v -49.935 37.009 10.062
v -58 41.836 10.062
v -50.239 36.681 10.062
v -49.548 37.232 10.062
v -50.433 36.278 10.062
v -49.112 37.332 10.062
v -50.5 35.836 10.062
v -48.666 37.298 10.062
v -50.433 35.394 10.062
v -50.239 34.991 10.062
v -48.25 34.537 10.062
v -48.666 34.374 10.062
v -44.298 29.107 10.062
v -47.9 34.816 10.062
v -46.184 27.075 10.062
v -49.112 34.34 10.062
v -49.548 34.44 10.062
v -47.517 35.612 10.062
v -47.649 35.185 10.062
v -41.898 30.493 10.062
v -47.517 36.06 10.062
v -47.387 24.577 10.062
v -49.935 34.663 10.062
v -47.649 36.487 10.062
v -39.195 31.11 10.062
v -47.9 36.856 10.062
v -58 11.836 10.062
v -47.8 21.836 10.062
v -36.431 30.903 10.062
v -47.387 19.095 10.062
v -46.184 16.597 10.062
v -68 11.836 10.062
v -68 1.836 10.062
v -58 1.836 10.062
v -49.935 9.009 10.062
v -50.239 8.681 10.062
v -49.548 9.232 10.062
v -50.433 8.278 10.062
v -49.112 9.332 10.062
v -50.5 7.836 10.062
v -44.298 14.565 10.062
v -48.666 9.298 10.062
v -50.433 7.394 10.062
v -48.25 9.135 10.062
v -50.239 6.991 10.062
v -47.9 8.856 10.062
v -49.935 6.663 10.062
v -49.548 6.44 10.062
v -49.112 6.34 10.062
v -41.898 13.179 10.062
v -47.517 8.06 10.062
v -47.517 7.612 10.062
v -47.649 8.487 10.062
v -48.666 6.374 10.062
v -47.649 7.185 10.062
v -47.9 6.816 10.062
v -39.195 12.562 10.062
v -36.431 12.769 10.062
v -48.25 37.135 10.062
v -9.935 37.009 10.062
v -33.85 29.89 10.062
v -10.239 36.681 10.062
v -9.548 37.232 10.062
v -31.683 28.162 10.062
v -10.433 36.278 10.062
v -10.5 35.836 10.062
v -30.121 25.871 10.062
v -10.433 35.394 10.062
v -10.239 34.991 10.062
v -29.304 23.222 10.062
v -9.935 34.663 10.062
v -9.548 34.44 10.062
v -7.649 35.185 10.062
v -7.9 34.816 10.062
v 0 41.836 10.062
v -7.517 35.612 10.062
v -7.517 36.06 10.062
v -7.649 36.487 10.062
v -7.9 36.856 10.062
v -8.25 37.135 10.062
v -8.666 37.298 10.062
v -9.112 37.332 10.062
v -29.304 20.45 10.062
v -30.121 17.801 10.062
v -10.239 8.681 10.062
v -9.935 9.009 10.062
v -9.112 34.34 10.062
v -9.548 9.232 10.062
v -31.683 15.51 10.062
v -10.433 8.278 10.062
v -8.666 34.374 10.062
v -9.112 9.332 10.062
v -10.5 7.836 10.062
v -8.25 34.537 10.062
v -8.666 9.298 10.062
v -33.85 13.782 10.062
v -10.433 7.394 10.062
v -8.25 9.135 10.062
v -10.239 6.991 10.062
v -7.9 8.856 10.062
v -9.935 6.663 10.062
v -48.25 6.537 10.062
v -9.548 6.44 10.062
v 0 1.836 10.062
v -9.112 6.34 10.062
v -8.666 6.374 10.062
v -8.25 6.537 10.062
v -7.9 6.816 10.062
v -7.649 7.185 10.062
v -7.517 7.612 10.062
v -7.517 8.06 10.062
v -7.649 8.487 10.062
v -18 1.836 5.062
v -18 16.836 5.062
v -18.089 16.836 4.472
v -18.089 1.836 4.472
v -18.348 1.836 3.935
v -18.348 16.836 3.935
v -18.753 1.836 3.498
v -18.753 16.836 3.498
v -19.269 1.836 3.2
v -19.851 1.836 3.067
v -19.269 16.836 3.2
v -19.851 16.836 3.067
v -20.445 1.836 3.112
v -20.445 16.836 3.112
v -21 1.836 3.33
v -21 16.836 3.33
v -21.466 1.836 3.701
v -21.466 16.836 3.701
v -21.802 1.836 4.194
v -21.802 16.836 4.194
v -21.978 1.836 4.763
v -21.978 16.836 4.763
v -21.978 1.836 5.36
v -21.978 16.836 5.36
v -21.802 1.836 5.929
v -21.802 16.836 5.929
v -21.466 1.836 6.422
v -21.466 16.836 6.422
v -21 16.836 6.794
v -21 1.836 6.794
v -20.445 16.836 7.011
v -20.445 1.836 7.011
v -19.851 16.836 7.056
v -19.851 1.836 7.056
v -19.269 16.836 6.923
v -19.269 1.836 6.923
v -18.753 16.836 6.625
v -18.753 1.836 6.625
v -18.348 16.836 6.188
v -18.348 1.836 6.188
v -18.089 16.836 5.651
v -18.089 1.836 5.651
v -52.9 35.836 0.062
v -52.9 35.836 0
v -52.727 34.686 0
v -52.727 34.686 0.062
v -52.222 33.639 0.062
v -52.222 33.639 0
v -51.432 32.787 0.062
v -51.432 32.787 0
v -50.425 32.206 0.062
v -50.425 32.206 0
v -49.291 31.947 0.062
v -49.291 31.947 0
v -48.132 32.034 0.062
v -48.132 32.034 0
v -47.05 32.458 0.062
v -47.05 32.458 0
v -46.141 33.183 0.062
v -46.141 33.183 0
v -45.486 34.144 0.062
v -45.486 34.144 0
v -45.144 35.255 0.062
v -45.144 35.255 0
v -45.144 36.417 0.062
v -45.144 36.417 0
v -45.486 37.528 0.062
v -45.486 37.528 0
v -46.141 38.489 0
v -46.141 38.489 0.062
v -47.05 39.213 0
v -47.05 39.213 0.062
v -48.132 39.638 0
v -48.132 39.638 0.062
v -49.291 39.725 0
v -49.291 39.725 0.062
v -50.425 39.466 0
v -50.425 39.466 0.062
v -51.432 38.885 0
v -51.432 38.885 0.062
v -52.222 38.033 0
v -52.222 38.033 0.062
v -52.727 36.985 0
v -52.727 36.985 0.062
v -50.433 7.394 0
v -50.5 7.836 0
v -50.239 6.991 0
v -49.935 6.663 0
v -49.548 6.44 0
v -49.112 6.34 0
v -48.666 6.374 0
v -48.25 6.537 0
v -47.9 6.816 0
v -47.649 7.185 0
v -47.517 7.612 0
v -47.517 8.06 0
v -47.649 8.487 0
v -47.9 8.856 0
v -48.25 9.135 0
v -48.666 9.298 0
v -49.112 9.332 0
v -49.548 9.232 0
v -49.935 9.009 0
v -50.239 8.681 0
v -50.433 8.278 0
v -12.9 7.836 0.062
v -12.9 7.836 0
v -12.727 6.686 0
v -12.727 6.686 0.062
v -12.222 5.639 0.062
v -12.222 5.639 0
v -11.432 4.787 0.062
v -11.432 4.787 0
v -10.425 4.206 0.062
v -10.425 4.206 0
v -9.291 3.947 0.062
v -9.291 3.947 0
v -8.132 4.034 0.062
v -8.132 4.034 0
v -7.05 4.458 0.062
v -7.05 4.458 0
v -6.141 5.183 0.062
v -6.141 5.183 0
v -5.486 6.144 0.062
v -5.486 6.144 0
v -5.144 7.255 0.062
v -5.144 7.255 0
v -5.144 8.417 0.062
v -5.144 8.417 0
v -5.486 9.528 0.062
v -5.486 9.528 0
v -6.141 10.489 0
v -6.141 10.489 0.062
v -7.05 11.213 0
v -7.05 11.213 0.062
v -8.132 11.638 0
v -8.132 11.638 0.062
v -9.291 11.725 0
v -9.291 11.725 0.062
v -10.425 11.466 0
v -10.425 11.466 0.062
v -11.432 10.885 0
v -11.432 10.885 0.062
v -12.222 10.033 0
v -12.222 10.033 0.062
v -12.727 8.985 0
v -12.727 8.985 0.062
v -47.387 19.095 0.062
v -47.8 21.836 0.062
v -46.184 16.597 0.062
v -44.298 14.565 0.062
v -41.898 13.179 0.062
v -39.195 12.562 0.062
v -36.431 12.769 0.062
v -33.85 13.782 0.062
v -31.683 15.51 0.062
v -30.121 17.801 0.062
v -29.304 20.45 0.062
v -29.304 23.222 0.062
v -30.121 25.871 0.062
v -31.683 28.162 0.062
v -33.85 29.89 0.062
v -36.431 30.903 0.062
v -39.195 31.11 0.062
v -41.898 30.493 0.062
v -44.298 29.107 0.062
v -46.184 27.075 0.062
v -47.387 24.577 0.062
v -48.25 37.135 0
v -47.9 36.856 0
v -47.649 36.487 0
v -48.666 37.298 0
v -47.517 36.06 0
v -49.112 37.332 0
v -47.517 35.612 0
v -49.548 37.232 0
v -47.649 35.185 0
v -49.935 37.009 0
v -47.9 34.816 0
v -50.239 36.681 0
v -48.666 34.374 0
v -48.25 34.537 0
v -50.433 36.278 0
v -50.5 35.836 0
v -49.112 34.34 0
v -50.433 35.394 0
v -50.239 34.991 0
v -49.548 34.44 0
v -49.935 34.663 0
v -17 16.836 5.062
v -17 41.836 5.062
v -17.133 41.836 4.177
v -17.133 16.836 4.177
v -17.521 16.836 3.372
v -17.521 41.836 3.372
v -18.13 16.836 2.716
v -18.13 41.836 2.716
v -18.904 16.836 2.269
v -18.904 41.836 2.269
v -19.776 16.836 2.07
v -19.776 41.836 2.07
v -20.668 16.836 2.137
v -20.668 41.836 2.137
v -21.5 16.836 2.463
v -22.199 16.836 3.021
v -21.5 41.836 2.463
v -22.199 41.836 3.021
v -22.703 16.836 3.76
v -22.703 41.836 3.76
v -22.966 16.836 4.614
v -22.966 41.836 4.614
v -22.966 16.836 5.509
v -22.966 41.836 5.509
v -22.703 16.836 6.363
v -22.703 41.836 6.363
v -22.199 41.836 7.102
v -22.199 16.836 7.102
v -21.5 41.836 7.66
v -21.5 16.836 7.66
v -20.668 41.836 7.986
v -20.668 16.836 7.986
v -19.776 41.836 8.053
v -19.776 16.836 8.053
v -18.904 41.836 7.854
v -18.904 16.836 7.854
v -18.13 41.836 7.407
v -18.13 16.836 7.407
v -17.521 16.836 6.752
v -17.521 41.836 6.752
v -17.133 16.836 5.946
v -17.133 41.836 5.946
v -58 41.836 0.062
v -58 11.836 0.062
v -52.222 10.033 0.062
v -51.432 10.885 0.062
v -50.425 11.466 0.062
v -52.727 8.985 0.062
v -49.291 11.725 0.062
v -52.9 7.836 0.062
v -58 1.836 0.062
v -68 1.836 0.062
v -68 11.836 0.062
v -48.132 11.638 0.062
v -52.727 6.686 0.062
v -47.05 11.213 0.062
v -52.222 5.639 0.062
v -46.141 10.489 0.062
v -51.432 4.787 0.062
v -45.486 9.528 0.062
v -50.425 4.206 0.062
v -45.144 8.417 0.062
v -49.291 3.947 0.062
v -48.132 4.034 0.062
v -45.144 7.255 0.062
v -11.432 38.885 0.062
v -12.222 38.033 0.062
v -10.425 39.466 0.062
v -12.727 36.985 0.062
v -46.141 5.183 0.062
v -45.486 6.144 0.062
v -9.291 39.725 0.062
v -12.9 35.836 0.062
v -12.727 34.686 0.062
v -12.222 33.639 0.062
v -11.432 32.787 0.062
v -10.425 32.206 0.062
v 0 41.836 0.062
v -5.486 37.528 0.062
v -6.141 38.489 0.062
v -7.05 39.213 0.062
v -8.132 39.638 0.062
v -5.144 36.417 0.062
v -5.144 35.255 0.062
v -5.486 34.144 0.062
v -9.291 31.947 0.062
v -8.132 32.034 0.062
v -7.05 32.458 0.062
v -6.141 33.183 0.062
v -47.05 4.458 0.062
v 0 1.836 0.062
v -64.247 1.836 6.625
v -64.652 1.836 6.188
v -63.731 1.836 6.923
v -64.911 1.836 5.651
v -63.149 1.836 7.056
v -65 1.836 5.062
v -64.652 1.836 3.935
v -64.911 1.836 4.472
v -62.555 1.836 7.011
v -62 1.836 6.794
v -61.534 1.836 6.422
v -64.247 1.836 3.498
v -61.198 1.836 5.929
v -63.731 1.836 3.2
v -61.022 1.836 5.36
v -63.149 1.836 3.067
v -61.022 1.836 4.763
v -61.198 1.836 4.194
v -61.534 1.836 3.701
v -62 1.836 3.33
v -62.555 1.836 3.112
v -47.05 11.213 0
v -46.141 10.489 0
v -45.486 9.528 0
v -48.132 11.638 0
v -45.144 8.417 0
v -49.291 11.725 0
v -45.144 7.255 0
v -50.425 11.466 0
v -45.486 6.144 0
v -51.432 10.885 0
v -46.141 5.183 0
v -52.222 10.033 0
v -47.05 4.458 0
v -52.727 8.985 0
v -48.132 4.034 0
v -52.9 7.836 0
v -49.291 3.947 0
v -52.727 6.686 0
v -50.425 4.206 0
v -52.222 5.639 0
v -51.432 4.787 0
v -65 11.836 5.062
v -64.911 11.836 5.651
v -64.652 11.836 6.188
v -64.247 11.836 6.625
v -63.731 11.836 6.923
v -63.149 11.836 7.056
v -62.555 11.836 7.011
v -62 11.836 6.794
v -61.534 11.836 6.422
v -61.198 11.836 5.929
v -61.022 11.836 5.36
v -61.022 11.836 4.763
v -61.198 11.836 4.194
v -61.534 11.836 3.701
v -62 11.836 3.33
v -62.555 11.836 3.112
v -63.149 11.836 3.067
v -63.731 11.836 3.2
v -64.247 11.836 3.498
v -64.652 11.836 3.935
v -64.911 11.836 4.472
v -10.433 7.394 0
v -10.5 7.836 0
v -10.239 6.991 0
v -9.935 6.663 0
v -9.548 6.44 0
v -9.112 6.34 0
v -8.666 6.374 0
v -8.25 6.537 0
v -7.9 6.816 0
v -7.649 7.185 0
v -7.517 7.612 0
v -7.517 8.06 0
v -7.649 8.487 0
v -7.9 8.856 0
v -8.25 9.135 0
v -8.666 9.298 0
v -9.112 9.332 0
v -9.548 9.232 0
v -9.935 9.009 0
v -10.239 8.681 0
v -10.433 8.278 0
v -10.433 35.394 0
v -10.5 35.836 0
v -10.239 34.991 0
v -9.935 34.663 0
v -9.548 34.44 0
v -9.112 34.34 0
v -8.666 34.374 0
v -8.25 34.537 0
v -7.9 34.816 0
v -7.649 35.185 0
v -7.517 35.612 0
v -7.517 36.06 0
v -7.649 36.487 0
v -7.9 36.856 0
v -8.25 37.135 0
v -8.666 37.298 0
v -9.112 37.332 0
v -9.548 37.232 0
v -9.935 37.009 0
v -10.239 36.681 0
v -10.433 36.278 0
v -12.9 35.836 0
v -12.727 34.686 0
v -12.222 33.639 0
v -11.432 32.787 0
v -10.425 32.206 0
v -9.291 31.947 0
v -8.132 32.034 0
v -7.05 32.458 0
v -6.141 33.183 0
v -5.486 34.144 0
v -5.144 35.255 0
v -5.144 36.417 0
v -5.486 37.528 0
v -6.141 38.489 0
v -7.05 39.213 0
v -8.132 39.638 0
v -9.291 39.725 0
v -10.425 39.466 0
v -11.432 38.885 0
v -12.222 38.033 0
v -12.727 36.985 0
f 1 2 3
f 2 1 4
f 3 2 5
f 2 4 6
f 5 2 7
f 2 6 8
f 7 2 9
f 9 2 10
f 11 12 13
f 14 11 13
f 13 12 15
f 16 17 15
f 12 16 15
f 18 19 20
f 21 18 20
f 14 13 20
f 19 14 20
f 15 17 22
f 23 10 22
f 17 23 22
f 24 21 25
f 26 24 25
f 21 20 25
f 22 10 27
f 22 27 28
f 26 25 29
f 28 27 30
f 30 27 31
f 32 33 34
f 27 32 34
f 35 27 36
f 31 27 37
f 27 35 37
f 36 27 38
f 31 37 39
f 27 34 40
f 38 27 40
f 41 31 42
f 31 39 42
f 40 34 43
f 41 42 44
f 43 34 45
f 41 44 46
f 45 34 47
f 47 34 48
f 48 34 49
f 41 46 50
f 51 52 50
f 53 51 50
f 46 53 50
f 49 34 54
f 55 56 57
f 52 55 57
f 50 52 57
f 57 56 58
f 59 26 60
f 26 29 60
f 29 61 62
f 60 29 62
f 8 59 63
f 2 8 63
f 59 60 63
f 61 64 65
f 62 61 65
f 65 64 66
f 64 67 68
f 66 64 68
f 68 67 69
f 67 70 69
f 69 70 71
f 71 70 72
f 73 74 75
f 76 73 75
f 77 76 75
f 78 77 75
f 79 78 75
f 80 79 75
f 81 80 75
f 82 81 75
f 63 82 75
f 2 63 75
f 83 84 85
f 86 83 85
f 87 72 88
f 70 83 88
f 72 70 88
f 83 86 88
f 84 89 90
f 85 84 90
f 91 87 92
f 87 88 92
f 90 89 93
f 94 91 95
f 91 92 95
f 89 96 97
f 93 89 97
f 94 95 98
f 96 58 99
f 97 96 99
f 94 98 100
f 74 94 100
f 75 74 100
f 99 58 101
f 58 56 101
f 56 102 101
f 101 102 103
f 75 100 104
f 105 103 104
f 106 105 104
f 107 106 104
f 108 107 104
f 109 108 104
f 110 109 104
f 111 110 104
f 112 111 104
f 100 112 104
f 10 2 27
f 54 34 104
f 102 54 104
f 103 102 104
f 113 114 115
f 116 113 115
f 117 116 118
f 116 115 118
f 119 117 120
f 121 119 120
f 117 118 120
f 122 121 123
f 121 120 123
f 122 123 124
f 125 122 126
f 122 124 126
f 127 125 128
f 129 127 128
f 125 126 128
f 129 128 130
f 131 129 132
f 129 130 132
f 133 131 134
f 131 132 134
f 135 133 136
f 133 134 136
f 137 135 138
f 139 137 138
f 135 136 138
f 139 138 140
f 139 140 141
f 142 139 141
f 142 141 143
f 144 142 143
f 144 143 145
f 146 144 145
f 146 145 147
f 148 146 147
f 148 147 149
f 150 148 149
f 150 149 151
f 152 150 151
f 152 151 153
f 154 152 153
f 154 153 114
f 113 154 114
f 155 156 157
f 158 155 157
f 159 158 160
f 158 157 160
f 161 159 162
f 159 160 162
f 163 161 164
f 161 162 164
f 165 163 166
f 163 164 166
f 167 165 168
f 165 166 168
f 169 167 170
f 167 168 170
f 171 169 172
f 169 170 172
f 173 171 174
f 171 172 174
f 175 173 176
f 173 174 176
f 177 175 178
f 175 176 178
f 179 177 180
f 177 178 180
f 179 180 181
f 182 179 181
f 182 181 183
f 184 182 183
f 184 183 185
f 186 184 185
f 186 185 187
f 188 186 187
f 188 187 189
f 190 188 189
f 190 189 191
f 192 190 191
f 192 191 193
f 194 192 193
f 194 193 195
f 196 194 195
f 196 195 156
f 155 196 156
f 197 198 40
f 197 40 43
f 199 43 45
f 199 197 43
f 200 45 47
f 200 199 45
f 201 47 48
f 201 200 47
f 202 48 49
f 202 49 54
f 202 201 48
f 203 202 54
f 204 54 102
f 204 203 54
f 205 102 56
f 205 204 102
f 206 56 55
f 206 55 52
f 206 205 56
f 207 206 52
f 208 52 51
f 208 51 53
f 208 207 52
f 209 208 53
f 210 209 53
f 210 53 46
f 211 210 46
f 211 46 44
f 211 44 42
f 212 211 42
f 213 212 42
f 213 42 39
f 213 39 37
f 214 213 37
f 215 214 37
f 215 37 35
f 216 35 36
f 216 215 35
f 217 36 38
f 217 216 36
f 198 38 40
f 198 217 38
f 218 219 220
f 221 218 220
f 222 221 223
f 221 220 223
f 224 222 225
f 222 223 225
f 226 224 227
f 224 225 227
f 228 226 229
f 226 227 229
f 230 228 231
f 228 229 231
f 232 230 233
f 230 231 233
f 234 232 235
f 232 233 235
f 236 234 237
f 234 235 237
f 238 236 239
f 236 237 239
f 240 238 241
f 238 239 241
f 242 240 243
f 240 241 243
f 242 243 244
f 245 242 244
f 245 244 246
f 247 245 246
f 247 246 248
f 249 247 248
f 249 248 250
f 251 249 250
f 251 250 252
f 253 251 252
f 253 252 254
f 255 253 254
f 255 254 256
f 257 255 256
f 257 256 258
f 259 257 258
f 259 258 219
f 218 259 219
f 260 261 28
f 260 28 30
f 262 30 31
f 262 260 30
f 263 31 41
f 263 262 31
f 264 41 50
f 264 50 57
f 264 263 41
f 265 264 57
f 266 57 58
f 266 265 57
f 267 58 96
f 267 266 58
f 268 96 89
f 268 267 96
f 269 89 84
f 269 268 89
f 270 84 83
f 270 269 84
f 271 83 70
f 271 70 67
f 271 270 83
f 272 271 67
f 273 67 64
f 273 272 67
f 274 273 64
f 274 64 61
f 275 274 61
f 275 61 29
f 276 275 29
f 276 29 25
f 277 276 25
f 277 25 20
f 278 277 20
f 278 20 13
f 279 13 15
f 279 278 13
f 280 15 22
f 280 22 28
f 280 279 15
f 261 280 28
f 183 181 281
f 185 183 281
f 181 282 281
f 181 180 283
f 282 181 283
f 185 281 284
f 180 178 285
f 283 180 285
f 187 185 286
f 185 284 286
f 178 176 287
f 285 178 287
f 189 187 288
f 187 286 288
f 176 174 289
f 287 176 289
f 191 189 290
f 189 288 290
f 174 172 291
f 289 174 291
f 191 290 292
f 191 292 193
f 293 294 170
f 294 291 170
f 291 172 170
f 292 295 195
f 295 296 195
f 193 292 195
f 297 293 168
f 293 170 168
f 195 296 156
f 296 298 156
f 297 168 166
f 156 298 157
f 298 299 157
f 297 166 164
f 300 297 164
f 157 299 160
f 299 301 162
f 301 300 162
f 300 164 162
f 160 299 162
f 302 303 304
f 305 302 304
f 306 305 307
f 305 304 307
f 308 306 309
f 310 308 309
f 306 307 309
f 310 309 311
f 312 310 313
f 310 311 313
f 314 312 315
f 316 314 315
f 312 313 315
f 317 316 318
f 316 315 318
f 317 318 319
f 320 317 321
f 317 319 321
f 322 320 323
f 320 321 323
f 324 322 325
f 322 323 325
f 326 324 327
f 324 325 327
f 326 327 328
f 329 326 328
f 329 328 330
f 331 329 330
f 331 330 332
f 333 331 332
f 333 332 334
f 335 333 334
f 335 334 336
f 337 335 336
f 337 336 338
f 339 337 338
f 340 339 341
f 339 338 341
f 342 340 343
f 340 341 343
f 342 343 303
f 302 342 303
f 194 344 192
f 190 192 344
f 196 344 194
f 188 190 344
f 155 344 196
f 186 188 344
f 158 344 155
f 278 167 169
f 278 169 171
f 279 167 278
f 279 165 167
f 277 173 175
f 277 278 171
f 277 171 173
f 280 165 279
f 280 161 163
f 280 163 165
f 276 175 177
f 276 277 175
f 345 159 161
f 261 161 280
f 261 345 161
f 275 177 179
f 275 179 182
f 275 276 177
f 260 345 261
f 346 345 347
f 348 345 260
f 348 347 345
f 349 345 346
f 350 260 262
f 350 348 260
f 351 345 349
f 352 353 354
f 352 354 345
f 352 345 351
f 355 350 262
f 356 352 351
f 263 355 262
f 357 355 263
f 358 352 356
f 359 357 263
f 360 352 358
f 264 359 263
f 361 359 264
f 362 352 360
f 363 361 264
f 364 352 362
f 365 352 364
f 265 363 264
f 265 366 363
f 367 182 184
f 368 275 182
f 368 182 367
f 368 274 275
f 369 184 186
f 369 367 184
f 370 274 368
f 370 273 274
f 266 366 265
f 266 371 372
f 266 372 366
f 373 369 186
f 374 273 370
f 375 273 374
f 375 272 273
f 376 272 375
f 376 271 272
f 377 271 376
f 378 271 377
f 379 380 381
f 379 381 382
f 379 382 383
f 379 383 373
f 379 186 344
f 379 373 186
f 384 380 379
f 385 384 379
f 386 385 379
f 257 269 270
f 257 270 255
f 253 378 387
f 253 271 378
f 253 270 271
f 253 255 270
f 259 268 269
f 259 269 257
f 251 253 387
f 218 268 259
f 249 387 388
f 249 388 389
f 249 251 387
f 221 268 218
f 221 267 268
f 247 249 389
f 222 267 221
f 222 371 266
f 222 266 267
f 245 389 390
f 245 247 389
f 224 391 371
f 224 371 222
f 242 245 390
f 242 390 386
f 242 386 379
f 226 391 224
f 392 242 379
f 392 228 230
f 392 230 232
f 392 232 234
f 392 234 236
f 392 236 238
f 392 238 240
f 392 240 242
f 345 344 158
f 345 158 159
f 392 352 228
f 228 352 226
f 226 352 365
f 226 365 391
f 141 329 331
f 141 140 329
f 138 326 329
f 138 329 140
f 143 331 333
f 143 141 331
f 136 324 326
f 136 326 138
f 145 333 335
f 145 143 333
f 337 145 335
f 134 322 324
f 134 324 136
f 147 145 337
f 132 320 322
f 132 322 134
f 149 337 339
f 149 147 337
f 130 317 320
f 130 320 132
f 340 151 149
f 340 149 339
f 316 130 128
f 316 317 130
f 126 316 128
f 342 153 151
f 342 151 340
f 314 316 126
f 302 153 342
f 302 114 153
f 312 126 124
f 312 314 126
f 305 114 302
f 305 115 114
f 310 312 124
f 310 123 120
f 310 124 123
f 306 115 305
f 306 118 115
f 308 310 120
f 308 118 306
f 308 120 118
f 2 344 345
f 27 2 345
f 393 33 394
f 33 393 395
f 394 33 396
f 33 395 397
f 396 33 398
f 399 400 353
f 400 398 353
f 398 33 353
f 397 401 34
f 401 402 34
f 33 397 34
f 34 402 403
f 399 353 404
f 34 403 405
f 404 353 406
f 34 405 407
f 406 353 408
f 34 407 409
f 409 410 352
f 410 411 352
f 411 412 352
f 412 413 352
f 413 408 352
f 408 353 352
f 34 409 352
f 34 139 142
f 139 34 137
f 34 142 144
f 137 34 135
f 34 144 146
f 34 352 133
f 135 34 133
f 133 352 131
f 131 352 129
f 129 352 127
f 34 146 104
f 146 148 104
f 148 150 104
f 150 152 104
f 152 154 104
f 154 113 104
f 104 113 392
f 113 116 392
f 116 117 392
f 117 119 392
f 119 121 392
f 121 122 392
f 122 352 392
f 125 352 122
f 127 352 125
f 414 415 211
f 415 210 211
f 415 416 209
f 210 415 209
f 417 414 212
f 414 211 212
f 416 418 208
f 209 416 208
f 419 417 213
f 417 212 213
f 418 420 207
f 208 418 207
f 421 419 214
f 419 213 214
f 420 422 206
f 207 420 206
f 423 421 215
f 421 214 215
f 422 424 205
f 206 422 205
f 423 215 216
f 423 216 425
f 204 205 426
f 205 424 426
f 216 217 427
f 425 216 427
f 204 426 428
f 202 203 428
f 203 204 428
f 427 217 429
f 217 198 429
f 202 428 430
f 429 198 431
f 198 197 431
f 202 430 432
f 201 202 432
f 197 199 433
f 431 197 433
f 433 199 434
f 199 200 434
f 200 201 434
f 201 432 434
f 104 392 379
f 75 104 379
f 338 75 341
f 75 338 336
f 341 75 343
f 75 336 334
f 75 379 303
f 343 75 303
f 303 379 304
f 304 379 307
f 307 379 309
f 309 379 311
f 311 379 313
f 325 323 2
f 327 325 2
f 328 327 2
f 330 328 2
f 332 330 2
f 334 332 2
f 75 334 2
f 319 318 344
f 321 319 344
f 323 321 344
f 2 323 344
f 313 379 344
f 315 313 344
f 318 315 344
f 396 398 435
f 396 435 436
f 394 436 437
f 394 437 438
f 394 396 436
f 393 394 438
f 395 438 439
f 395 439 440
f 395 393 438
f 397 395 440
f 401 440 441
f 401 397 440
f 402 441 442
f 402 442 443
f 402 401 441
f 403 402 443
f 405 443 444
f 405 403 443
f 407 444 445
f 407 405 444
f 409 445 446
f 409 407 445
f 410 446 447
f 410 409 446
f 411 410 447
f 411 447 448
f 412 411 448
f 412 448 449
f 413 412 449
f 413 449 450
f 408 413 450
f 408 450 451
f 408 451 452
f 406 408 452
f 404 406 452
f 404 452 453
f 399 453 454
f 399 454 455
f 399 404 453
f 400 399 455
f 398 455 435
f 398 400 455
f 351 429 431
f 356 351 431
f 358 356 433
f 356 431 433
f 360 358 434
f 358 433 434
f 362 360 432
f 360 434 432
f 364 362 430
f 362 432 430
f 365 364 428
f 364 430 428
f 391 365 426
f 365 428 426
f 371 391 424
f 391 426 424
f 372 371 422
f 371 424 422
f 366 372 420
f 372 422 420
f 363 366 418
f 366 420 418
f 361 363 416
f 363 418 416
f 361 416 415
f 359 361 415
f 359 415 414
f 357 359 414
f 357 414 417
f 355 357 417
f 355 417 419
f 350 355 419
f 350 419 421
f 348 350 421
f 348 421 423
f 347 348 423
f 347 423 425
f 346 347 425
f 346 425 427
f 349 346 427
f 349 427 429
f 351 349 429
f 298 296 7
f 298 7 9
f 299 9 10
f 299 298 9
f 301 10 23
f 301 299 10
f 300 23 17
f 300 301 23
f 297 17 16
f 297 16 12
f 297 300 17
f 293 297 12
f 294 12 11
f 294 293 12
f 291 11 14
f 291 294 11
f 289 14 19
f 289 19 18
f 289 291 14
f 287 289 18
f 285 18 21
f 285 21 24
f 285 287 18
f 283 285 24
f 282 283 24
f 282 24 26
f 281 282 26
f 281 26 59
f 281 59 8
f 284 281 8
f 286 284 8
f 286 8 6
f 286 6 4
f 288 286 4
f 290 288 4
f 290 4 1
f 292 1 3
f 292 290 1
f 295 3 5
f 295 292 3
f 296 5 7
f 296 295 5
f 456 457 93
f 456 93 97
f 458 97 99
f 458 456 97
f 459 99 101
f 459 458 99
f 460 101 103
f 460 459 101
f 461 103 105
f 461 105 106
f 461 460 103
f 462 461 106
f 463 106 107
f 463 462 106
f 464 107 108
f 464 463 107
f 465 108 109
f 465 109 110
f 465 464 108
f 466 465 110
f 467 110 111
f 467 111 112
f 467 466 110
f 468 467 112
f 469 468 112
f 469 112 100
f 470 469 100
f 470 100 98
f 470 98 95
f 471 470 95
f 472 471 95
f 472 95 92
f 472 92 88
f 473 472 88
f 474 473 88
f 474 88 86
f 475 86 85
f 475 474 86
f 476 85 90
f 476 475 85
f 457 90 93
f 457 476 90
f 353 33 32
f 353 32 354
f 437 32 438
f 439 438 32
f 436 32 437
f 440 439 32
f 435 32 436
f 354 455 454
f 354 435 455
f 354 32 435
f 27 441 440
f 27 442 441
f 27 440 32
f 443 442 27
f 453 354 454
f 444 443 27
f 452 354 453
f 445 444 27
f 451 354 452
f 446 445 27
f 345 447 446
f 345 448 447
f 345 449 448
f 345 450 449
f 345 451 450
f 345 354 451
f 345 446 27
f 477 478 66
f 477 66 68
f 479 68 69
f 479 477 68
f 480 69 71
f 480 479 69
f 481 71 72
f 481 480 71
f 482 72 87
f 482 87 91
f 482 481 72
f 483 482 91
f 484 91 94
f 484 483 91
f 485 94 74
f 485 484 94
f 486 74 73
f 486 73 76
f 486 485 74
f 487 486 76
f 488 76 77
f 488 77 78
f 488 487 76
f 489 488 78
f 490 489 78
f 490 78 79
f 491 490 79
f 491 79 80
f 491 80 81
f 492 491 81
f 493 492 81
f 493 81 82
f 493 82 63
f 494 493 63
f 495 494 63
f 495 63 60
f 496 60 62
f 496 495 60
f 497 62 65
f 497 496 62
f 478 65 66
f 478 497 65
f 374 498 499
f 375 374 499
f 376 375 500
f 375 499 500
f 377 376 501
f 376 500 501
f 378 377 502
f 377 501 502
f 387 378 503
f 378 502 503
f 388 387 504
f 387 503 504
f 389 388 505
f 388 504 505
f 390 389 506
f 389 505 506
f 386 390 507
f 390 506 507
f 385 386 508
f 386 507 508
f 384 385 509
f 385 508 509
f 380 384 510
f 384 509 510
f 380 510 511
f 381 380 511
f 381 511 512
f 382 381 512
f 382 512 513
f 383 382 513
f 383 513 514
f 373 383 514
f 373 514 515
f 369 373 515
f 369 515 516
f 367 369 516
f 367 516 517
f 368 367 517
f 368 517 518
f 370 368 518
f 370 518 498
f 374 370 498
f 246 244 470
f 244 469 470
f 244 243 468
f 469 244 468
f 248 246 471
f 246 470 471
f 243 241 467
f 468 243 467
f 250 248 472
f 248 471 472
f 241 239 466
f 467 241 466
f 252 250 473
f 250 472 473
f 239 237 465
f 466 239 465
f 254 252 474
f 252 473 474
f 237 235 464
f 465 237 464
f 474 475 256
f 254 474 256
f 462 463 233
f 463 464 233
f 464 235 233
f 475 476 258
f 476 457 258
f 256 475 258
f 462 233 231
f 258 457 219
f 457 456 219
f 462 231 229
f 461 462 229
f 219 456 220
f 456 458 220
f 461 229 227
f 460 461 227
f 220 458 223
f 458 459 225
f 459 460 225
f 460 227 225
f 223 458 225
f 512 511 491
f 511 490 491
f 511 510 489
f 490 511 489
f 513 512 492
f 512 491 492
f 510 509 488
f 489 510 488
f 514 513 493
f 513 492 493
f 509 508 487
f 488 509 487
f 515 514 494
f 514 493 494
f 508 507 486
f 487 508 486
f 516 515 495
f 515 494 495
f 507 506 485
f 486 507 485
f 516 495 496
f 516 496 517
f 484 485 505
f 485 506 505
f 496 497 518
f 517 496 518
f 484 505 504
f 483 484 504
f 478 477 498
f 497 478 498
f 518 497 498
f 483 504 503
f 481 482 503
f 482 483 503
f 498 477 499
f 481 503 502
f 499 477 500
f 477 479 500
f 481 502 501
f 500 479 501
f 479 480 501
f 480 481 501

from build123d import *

# Parameters (mm, degrees)
SKETCH1_R             = 3.9
SKETCH1_R_2           = 1.5
BOSS_EXTRUDE1_DEPTH   = 10.061552014
BOSS_EXTRUDE1_2_DEPTH = 10.061552014
BOSS_EXTRUDE1_3_DEPTH = 10.061552014
BOSS_EXTRUDE1_4_DEPTH = 10.061552014
BOSS_EXTRUDE2_START   = 1.861552
SKETCH2_R             = 3.9
SKETCH2_R_2           = 9.3
BOSS_EXTRUDE2_DEPTH   = 10
CUT_EXTRUDE1_DEPTH    = 25
CUT_EXTRUDE2_DEPTH    = 72.170463178
SKETCH5_W             = 10
SKETCH5_H             = 10
SKETCH5_R             = 2
BOSS_EXTRUDE3_DEPTH   = 10


with BuildPart() as part:
    # Sketch1 → Boss-Extrude1 (new body)
    with BuildSketch(Plane.XY):
        with Locations(Location((-49, 7.83595021, 0), (0, 0, 180))):
            Circle(SKETCH1_R)
        with Locations(Location((-49, 7.83595021, 0), (0, 0, 180))):
            Circle(SKETCH1_R_2, mode=Mode.SUBTRACT)
    extrude(amount=BOSS_EXTRUDE1_DEPTH)



with BuildPart() as body_2:
    # Sketch1 → Boss-Extrude1 2 (new body)
    with BuildSketch(Plane.XY):
        with Locations(Location((-49, 35.83595021, 0), (0, 0, 180))):
            Circle(SKETCH1_R)
        with Locations(Location((-49, 35.83595021, 0), (0, 0, 180))):
            Circle(SKETCH1_R_2, mode=Mode.SUBTRACT)
    extrude(amount=BOSS_EXTRUDE1_2_DEPTH)


with BuildPart() as body_3:
    # Sketch1 → Boss-Extrude1 3 (new body)
    with BuildSketch(Plane.XY):
        with Locations(Location((-9, 35.83595021, 0), (0, 0, 180))):
            Circle(SKETCH1_R)
        with Locations(Location((-9, 35.83595021, 0), (0, 0, 180))):
            Circle(SKETCH1_R_2, mode=Mode.SUBTRACT)
    extrude(amount=BOSS_EXTRUDE1_3_DEPTH)


with BuildPart() as body_4:
    # Sketch1 → Boss-Extrude1 4 (new body)
    with BuildSketch(Plane.XY):
        with Locations(Location((-9, 7.83595021, 0), (0, 0, 180))):
            Circle(SKETCH1_R)
        with Locations(Location((-9, 7.83595021, 0), (0, 0, 180))):
            Circle(SKETCH1_R_2, mode=Mode.SUBTRACT)
    extrude(amount=BOSS_EXTRUDE1_4_DEPTH)


with BuildPart() as part_1:
    add(part.part)

    add(body_2.part)  # Boss-Extrude2 merges body 2

    add(body_3.part)  # Boss-Extrude2 merges body 3

    add(body_4.part)  # Boss-Extrude2 merges body 4
    # Sketch2 → Boss-Extrude2 (add)
    with BuildSketch(Plane.XY.offset(-1.8).offset(BOSS_EXTRUDE2_START)):
        Polygon((-58, 1.83595021), (0, 1.83595021), (0, 5.290014366), (0, 38.441339865), (0, 41.83595021), (-58, 41.83595021), align=None)
        with Locations(Location((-9, 35.83595021, 0), (0, 0, 180))):
            Circle(SKETCH2_R, mode=Mode.SUBTRACT)
        with Locations((-49, 7.83595021)):
            Circle(SKETCH2_R, mode=Mode.SUBTRACT)
        with Locations(Location((-38.5, 21.83595021, 0), (0, 0, 180))):
            Circle(SKETCH2_R_2, mode=Mode.SUBTRACT)
        with Locations(Location((-49, 35.83595021, 0), (0, 0, 180))):
            Circle(SKETCH2_R, mode=Mode.SUBTRACT)
        with Locations(Location((-9, 7.83595021, 0), (0, 0, 180))):
            Circle(SKETCH2_R, mode=Mode.SUBTRACT)
    extrude(amount=BOSS_EXTRUDE2_DEPTH)

    # Sketch4 → Cut-Extrude1 (cut)
    with BuildSketch(Plane(origin=(0, 41.83595021, 0), x_dir=(1, 0, 0), z_dir=(0, 1, 0))):
        with BuildLine():
            ThreePointArc((-23, -5.061552014), (-20, -8.061552014), (-17, -5.061552014))
            Line((-17, -5.061552014), (-18, -5.061552014))
            ThreePointArc((-18, -5.061552014), (-20, -7.061552014), (-22, -5.061552014))
            Line((-22, -5.061552014), (-23, -5.061552014))
        make_face()
        with BuildLine():
            Line((-18, -5.061552014), (-17, -5.061552014))
            ThreePointArc((-17, -5.061552014), (-20, -2.061552014), (-23, -5.061552014))
            Line((-23, -5.061552014), (-22, -5.061552014))
            ThreePointArc((-22, -5.061552014), (-20, -3.061552014), (-18, -5.061552014))
        make_face()
        with BuildLine():
            ThreePointArc((-22, -5.061552014), (-20, -7.061552014), (-18, -5.061552014))
            Line((-18, -5.061552014), (-22, -5.061552014))
        make_face()
        with BuildLine():
            Line((-22, -5.061552014), (-18, -5.061552014))
            ThreePointArc((-18, -5.061552014), (-20, -3.061552014), (-22, -5.061552014))
        make_face()
    extrude(amount=-CUT_EXTRUDE1_DEPTH, mode=Mode.SUBTRACT)

    # Sketch4<3> → Cut-Extrude2 (cut, through all)
    with BuildSketch(Plane(origin=(0, 41.83595021, 0), x_dir=(1, 0, 0), z_dir=(0, 1, 0))):
        with BuildLine():
            ThreePointArc((-22, -5.061552014), (-20, -7.061552014), (-18, -5.061552014))
            Line((-18, -5.061552014), (-22, -5.061552014))
        make_face()
        with BuildLine():
            Line((-22, -5.061552014), (-18, -5.061552014))
            ThreePointArc((-18, -5.061552014), (-20, -3.061552014), (-22, -5.061552014))
        make_face()
    extrude(amount=-CUT_EXTRUDE2_DEPTH, mode=Mode.SUBTRACT)

    # Sketch5 → Boss-Extrude3 (add)
    with BuildSketch(Plane(origin=(0, 1.83595021, 0), x_dir=(1, 0, 0), z_dir=(0, 1, 0))):
        with Locations((-63, -5.061552014)):
            Rectangle(SKETCH5_W, SKETCH5_H)
        with Locations(Location((-63, -5.061552014, 0), (0, 0, 180))):
            Circle(SKETCH5_R, mode=Mode.SUBTRACT)
    extrude(amount=BOSS_EXTRUDE3_DEPTH)


solid = part_1.part
